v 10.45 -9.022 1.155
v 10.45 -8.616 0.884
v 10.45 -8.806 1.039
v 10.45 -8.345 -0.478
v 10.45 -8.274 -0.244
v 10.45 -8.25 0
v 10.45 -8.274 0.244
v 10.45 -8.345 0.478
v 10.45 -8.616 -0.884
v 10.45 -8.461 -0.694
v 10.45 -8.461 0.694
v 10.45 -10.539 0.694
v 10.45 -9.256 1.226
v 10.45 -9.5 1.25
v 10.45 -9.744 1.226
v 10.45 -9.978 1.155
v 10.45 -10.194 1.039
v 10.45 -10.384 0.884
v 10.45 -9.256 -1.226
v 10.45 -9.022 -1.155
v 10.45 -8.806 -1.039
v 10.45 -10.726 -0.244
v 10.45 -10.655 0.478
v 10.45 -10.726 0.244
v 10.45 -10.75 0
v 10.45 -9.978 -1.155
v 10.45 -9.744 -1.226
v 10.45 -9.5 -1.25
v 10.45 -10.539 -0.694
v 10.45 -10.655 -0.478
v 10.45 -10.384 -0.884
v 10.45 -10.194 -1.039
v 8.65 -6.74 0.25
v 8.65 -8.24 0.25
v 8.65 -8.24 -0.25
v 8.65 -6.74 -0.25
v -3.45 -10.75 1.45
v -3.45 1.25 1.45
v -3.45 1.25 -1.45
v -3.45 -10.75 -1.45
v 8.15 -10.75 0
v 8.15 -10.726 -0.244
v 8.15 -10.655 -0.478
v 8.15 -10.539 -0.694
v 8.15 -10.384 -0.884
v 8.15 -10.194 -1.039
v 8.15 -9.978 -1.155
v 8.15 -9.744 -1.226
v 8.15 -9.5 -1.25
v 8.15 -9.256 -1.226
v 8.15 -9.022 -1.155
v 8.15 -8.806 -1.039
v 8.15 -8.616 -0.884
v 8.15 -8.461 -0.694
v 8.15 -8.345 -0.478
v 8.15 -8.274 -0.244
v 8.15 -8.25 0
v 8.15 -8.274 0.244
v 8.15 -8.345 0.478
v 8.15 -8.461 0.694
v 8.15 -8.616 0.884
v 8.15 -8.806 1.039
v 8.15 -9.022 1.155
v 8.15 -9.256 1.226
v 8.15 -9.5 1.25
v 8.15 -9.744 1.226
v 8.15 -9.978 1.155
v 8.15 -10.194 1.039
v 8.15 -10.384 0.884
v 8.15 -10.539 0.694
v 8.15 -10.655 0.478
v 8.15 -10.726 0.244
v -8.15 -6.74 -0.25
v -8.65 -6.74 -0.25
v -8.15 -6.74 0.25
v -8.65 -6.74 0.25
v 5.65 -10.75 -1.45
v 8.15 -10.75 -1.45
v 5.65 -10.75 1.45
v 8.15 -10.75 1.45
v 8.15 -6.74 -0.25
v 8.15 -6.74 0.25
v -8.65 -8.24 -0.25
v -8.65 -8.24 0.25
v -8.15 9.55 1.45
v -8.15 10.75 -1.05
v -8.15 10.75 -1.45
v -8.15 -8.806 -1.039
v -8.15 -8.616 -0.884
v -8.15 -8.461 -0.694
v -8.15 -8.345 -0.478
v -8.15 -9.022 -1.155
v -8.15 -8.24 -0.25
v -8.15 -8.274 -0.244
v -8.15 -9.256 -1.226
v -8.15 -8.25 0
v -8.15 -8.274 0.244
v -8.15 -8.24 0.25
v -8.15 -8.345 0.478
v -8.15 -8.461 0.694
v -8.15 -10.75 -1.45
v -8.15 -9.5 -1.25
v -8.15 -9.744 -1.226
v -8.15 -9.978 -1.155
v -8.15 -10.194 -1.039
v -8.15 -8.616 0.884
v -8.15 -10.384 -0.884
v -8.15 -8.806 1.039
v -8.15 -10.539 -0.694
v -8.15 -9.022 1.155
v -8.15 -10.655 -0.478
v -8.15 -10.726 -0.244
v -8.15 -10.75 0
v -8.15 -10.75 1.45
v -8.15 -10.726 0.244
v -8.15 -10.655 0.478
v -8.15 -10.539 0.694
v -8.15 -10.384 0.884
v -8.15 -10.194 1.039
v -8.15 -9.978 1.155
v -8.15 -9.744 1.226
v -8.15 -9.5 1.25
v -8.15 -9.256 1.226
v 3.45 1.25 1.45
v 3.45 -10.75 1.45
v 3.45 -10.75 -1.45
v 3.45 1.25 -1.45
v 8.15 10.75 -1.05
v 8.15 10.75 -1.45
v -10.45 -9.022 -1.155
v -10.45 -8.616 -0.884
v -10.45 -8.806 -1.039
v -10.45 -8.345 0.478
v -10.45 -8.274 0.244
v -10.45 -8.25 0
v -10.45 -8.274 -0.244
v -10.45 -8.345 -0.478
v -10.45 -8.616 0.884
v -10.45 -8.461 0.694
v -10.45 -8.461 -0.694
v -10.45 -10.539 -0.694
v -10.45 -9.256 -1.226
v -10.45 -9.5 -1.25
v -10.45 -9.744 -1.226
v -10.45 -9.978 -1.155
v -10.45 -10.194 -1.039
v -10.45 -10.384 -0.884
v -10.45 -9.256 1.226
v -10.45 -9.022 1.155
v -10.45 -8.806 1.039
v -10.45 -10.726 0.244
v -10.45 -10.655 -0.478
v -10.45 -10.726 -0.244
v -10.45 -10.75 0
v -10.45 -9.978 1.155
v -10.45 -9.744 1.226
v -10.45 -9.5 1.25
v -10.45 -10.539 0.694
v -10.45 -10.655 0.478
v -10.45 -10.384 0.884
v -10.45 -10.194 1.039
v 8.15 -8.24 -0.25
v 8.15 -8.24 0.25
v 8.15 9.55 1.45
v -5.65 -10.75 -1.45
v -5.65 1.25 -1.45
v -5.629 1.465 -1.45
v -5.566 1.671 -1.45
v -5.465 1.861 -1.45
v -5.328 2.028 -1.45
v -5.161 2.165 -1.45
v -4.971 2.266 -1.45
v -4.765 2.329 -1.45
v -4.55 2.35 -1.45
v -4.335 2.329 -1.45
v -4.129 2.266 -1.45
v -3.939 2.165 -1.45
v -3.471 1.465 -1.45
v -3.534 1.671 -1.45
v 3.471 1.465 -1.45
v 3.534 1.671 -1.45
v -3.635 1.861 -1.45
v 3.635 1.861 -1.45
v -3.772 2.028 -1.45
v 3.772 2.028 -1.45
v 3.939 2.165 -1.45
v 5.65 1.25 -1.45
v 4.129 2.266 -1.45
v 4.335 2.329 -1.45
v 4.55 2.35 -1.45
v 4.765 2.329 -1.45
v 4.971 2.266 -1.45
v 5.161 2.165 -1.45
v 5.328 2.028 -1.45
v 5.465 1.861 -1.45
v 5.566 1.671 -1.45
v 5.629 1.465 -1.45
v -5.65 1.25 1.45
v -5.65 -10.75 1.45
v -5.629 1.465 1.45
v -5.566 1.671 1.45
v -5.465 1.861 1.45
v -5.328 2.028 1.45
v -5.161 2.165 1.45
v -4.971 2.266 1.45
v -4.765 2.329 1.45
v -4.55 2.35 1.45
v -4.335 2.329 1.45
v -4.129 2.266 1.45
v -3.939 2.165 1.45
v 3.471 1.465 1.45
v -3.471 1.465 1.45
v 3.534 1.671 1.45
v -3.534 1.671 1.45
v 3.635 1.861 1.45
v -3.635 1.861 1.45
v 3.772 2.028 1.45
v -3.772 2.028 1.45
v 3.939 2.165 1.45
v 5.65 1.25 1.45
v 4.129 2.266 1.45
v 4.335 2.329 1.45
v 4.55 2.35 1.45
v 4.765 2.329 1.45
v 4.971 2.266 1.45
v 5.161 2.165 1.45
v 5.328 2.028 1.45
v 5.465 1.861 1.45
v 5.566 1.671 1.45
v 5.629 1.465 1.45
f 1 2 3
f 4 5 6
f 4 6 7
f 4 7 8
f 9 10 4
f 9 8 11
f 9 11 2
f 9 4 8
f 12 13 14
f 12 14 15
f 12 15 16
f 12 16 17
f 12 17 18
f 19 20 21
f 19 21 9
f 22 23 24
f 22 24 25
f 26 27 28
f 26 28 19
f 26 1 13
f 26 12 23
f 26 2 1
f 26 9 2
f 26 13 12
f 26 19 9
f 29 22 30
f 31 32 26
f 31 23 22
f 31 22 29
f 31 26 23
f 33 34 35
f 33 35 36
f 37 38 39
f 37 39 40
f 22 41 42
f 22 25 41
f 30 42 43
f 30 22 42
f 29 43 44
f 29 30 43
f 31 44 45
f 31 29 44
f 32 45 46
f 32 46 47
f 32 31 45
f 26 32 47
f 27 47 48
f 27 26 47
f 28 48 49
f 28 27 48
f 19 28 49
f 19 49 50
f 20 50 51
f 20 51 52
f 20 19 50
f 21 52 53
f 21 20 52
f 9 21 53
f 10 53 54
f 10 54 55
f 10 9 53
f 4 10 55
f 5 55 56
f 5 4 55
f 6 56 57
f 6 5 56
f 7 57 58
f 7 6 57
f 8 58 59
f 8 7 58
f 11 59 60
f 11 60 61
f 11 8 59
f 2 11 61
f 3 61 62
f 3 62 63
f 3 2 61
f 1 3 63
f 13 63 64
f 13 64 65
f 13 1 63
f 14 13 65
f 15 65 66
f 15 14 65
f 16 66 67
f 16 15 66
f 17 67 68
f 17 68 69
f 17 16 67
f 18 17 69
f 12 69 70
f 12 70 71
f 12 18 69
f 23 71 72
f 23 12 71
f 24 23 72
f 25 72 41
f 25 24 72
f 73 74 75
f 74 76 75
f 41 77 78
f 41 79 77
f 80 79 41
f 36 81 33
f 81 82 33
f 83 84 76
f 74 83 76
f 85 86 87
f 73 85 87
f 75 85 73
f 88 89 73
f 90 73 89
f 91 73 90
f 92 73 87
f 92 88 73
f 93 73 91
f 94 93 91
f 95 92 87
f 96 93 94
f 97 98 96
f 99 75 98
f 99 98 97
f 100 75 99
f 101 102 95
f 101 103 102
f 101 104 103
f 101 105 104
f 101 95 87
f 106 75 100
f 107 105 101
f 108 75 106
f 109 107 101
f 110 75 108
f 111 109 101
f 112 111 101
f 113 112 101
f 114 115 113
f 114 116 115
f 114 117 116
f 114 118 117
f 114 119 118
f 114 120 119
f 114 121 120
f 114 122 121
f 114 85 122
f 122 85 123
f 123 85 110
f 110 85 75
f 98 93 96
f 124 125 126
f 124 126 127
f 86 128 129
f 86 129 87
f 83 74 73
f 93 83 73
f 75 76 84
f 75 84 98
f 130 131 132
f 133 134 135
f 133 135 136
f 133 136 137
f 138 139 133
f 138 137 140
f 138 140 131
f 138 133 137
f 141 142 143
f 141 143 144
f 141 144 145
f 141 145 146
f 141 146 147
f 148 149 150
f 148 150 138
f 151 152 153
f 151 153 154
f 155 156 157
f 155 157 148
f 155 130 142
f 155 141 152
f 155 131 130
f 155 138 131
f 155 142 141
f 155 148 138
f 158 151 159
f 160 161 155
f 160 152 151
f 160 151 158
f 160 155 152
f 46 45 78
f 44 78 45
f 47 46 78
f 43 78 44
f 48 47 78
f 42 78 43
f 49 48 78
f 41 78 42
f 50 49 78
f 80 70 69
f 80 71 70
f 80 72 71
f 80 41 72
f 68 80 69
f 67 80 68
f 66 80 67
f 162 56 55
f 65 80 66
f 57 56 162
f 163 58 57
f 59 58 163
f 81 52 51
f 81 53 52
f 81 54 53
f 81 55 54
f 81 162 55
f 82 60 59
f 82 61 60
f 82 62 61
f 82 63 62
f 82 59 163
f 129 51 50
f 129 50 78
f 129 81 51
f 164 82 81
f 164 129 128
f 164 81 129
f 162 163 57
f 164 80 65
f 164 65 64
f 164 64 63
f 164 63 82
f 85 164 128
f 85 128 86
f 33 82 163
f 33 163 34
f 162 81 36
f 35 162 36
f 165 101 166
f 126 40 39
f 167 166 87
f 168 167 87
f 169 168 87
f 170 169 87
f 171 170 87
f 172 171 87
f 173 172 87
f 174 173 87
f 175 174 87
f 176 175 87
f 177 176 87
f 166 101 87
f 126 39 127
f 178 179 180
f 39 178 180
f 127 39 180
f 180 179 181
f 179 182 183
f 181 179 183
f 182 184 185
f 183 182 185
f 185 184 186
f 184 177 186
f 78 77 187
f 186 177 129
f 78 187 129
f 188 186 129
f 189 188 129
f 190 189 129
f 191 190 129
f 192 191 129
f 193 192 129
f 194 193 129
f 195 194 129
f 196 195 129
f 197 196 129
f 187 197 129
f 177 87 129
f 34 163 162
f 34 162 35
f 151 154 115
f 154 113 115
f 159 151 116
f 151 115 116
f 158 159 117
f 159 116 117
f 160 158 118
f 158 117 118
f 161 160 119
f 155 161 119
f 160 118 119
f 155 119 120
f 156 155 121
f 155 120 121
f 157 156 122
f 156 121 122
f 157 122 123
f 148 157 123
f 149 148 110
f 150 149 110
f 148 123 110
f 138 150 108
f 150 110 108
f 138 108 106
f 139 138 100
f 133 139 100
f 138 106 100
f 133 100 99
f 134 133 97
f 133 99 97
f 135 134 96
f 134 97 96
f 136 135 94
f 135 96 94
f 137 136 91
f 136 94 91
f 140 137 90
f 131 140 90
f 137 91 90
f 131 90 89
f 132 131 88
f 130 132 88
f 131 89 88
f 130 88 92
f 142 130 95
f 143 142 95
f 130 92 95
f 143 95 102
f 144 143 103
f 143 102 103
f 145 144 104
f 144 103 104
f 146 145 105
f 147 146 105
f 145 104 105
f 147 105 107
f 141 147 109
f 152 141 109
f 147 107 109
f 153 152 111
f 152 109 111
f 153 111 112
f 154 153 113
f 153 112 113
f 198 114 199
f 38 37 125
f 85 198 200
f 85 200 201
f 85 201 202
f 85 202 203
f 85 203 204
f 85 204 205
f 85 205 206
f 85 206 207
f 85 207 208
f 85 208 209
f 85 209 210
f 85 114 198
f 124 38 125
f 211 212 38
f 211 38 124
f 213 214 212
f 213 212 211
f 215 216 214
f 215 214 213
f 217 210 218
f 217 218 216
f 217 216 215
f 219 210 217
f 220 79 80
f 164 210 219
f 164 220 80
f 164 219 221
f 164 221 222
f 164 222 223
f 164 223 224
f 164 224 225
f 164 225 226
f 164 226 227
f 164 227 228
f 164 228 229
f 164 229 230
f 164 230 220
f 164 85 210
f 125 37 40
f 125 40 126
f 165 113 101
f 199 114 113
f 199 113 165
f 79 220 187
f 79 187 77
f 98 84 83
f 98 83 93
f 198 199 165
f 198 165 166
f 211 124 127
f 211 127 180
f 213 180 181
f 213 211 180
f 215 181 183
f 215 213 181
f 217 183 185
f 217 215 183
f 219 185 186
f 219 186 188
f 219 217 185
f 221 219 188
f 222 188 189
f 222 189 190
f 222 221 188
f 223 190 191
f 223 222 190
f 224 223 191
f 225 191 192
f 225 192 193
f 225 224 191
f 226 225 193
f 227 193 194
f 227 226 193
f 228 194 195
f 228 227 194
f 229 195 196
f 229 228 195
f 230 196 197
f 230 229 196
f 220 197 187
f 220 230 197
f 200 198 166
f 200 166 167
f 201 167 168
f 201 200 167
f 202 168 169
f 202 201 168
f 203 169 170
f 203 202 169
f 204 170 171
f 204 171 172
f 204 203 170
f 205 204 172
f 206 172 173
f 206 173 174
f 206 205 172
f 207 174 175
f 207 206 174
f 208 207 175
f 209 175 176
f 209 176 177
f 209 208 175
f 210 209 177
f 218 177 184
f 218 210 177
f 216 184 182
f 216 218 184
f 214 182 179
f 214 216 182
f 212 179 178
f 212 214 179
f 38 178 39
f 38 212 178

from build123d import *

# Parameters (mm, degrees)
F1_DEPTH = 1.45
F0_W     = 2.3
F0_H     = 1.25
F4_SIZE2 = 1.2
F4_SIZE  = 2.5
F0_W_2   = 0.5
F0_H_2   = 1.5
F5_DEPTH = 0.25
F6_DEPTH = 0.25


with BuildPart() as f1:
    # F0 (on Top) → F1 (new body, symmetric)
    with BuildSketch(Plane.XY):
        with BuildLine():
            Line((8.15, -6.74), (8.15, 10.75))
            Line((8.15, 10.75), (-8.15, 10.75))
            Line((-8.15, 10.75), (-8.15, -6.74))
            Line((-8.15, -6.74), (-8.15, -8.24))
            Line((-8.15, -8.24), (-8.15, -8.25))
            Line((-8.15, -8.25), (-8.15, -9.5))
            Line((-8.15, -9.5), (-8.15, -10.75))
            Line((-8.15, -10.75), (-5.65, -10.75))
            Line((-5.65, -10.75), (-5.65, 1.25))
            ThreePointArc((-5.65, 1.25), (-4.55, 2.35), (-3.45, 1.25))
            Line((-3.45, 1.25), (-3.45, -10.75))
            Line((-3.45, -10.75), (3.45, -10.75))
            Line((3.45, -10.75), (3.45, 1.25))
            ThreePointArc((3.45, 1.25), (4.55, 2.35), (5.65, 1.25))
            Line((5.65, 1.25), (5.65, -10.75))
            Line((5.65, -10.75), (8.15, -10.75))
            Line((8.15, -10.75), (8.15, -9.5))
            Line((8.15, -9.5), (8.15, -8.25))
            Line((8.15, -8.25), (8.15, -8.24))
            Line((8.15, -8.24), (8.15, -6.74))
        make_face()
    extrude(amount=F1_DEPTH, both=True)

    # F0 (on Top) → F2 (revolve)
    with BuildSketch(Plane.XY):
        with Locations((9.3, -10.125)):
            Rectangle(F0_W, F0_H)
    revolve(axis=Axis((9.3, -9.5, 0), (1, 0, 0)))

    # F0 (on Top) → F3 (revolve)
    with BuildSketch(Plane.XY):
        with Locations((-9.3, -10.125)):
            Rectangle(F0_W, F0_H)
    revolve(axis=Axis((-9.3, -9.5, 0), (-1, 0, 0)))

    # F4
    f4_edges = [f1.edges().sort_by_distance(p)[0] for p in [
        (0, 10.75, 1.45),
    ]]
    chamfer(f4_edges, length=F4_SIZE, length2=F4_SIZE2)

    # F0 (on Top) → F5 (join, symmetric)
    with BuildSketch(Plane.XY):
        with Locations((8.4, -7.49)):
            Rectangle(F0_W_2, F0_H_2)
    extrude(amount=F5_DEPTH, both=True)

    # F0 (on Top) → F6 (join, symmetric)
    with BuildSketch(Plane.XY):
        with Locations((-8.4, -7.49)):
            Rectangle(F0_W_2, F0_H_2)
    extrude(amount=F6_DEPTH, both=True)


solid = f1.part
